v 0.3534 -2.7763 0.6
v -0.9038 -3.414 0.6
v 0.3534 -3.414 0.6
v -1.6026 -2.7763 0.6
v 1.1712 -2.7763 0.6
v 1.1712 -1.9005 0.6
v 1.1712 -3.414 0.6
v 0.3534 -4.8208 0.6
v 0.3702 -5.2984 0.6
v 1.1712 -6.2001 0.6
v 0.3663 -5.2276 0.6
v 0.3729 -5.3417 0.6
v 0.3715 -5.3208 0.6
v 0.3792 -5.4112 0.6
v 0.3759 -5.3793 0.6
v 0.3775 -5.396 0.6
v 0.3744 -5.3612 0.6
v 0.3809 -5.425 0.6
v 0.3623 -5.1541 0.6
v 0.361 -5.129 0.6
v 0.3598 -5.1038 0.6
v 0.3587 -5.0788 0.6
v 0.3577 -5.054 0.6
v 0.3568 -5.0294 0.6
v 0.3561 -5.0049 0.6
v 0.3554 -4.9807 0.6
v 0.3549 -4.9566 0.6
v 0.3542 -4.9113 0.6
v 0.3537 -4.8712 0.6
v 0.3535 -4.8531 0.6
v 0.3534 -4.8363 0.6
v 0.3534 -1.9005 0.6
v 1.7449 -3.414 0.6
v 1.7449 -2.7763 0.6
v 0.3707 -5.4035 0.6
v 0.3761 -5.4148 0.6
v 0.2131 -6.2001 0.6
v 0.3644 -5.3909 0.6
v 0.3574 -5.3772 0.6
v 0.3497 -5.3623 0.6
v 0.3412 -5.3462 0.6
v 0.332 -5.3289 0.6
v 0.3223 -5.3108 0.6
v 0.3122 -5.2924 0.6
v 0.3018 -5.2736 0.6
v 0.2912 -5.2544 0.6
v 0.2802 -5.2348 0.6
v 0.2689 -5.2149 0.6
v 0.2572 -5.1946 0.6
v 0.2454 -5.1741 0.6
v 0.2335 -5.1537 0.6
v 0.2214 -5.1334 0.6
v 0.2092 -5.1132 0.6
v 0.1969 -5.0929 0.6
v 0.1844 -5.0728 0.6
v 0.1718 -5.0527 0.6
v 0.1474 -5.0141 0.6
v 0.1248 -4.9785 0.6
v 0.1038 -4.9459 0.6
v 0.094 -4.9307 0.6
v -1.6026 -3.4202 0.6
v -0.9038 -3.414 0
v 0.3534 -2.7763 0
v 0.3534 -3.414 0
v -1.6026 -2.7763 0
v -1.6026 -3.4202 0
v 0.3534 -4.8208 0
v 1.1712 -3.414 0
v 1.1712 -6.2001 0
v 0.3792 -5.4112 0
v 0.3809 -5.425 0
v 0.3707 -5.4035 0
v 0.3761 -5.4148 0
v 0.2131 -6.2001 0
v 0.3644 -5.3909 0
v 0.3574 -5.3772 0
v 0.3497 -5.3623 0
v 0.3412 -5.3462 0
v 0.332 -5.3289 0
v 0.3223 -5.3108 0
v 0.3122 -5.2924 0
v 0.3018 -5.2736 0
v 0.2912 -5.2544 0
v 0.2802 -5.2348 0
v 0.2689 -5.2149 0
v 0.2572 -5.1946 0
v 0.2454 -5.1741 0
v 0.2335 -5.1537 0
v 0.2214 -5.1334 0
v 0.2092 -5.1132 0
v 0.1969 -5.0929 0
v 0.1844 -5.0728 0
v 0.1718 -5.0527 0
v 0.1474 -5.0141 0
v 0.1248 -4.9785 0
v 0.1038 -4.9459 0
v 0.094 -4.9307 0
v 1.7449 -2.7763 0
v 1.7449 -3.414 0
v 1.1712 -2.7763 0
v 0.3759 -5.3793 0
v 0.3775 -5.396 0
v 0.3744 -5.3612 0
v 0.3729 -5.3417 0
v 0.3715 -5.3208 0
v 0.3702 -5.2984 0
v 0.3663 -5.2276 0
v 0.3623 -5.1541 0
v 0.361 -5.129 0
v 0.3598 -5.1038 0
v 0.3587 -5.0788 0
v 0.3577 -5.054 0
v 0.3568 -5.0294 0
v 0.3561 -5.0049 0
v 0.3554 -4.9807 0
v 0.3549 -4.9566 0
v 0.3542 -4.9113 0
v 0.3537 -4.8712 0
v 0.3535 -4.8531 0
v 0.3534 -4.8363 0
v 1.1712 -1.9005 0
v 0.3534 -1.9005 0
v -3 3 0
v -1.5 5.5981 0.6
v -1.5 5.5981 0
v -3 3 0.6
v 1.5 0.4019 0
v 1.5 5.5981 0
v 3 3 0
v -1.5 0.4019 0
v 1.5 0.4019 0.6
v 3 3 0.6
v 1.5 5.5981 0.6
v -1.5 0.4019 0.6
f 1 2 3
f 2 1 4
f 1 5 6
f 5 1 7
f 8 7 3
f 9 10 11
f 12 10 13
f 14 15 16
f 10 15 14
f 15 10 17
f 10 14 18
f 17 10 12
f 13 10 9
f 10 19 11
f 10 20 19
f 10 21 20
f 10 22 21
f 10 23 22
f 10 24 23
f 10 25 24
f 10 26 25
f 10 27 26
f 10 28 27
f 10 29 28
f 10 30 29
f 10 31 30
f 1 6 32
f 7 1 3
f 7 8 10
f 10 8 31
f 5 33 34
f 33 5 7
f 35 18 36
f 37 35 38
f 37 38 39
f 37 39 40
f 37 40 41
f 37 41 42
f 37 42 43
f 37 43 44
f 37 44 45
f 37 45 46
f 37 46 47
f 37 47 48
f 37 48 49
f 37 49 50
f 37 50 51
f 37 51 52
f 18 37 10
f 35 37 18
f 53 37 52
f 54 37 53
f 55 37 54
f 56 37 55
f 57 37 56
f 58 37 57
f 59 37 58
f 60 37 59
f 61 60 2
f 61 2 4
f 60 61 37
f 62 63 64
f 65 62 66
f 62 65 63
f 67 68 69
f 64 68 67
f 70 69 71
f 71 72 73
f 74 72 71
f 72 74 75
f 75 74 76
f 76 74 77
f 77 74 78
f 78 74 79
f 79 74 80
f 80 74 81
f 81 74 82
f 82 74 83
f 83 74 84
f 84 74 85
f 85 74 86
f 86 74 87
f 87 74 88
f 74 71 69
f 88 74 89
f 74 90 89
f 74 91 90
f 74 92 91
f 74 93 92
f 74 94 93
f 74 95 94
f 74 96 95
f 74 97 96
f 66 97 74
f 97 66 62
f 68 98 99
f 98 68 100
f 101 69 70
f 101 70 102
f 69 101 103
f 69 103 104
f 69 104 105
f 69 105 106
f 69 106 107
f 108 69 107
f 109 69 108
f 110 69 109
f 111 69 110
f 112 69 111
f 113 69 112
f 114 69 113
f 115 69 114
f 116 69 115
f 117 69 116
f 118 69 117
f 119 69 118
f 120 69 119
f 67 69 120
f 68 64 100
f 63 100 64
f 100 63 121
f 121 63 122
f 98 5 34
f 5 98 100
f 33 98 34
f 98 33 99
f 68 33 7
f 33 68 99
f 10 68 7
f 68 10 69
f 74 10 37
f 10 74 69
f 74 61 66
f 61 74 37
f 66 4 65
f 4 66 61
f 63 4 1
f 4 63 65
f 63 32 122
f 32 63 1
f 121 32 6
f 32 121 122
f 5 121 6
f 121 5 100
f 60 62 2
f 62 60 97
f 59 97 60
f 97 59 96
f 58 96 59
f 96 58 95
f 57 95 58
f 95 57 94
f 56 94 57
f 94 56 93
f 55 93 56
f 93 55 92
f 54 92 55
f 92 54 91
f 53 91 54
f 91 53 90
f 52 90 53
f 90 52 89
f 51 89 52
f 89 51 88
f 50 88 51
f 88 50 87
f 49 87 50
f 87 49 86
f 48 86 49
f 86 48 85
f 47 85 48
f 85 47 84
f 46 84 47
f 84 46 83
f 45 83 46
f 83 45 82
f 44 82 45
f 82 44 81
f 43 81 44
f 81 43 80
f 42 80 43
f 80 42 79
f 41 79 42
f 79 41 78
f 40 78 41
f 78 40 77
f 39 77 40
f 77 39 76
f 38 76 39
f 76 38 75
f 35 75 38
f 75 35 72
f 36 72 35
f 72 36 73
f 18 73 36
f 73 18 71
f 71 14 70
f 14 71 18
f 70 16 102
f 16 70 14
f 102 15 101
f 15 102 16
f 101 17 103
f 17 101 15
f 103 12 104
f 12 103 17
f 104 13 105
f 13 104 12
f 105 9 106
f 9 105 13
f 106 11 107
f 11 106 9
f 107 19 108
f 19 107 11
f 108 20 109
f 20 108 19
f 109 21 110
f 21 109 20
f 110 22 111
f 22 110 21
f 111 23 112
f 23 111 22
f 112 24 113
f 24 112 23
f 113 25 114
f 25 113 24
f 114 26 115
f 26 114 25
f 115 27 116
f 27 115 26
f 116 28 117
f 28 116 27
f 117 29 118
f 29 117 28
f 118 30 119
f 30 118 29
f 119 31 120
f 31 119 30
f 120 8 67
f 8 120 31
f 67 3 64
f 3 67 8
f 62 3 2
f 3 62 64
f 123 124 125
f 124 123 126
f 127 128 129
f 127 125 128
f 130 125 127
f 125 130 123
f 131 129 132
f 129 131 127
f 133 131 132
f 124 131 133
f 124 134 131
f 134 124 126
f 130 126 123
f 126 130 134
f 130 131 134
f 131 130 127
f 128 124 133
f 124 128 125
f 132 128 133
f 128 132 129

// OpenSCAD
$fn = 50;

difference() {
	union() {
		translate(v = [0.0, -4.0, 0.6]) {
			rotate(a = [180, 0, 0]) {
				linear_extrude(height = 0.6) {
					text(font = "Liberation Sans:style=Bold", halign = "center", size = 4.5, text = "4", valign = "center");
				}
			}
		}
		translate(v = [0, 3, 0]) {
			linear_extrude(height = 0.6) {
				polygon(points = [[3.0, 0.0], [1.5000000000000004, 2.598076211353316], [-1.4999999999999993, 2.598076211353316], [-3.0, 3.6739403974420594e-16], [-1.5000000000000013, -2.5980762113533156], [1.499999999999998, -2.598076211353317]]);
			}
		}
	}
	union();
}
